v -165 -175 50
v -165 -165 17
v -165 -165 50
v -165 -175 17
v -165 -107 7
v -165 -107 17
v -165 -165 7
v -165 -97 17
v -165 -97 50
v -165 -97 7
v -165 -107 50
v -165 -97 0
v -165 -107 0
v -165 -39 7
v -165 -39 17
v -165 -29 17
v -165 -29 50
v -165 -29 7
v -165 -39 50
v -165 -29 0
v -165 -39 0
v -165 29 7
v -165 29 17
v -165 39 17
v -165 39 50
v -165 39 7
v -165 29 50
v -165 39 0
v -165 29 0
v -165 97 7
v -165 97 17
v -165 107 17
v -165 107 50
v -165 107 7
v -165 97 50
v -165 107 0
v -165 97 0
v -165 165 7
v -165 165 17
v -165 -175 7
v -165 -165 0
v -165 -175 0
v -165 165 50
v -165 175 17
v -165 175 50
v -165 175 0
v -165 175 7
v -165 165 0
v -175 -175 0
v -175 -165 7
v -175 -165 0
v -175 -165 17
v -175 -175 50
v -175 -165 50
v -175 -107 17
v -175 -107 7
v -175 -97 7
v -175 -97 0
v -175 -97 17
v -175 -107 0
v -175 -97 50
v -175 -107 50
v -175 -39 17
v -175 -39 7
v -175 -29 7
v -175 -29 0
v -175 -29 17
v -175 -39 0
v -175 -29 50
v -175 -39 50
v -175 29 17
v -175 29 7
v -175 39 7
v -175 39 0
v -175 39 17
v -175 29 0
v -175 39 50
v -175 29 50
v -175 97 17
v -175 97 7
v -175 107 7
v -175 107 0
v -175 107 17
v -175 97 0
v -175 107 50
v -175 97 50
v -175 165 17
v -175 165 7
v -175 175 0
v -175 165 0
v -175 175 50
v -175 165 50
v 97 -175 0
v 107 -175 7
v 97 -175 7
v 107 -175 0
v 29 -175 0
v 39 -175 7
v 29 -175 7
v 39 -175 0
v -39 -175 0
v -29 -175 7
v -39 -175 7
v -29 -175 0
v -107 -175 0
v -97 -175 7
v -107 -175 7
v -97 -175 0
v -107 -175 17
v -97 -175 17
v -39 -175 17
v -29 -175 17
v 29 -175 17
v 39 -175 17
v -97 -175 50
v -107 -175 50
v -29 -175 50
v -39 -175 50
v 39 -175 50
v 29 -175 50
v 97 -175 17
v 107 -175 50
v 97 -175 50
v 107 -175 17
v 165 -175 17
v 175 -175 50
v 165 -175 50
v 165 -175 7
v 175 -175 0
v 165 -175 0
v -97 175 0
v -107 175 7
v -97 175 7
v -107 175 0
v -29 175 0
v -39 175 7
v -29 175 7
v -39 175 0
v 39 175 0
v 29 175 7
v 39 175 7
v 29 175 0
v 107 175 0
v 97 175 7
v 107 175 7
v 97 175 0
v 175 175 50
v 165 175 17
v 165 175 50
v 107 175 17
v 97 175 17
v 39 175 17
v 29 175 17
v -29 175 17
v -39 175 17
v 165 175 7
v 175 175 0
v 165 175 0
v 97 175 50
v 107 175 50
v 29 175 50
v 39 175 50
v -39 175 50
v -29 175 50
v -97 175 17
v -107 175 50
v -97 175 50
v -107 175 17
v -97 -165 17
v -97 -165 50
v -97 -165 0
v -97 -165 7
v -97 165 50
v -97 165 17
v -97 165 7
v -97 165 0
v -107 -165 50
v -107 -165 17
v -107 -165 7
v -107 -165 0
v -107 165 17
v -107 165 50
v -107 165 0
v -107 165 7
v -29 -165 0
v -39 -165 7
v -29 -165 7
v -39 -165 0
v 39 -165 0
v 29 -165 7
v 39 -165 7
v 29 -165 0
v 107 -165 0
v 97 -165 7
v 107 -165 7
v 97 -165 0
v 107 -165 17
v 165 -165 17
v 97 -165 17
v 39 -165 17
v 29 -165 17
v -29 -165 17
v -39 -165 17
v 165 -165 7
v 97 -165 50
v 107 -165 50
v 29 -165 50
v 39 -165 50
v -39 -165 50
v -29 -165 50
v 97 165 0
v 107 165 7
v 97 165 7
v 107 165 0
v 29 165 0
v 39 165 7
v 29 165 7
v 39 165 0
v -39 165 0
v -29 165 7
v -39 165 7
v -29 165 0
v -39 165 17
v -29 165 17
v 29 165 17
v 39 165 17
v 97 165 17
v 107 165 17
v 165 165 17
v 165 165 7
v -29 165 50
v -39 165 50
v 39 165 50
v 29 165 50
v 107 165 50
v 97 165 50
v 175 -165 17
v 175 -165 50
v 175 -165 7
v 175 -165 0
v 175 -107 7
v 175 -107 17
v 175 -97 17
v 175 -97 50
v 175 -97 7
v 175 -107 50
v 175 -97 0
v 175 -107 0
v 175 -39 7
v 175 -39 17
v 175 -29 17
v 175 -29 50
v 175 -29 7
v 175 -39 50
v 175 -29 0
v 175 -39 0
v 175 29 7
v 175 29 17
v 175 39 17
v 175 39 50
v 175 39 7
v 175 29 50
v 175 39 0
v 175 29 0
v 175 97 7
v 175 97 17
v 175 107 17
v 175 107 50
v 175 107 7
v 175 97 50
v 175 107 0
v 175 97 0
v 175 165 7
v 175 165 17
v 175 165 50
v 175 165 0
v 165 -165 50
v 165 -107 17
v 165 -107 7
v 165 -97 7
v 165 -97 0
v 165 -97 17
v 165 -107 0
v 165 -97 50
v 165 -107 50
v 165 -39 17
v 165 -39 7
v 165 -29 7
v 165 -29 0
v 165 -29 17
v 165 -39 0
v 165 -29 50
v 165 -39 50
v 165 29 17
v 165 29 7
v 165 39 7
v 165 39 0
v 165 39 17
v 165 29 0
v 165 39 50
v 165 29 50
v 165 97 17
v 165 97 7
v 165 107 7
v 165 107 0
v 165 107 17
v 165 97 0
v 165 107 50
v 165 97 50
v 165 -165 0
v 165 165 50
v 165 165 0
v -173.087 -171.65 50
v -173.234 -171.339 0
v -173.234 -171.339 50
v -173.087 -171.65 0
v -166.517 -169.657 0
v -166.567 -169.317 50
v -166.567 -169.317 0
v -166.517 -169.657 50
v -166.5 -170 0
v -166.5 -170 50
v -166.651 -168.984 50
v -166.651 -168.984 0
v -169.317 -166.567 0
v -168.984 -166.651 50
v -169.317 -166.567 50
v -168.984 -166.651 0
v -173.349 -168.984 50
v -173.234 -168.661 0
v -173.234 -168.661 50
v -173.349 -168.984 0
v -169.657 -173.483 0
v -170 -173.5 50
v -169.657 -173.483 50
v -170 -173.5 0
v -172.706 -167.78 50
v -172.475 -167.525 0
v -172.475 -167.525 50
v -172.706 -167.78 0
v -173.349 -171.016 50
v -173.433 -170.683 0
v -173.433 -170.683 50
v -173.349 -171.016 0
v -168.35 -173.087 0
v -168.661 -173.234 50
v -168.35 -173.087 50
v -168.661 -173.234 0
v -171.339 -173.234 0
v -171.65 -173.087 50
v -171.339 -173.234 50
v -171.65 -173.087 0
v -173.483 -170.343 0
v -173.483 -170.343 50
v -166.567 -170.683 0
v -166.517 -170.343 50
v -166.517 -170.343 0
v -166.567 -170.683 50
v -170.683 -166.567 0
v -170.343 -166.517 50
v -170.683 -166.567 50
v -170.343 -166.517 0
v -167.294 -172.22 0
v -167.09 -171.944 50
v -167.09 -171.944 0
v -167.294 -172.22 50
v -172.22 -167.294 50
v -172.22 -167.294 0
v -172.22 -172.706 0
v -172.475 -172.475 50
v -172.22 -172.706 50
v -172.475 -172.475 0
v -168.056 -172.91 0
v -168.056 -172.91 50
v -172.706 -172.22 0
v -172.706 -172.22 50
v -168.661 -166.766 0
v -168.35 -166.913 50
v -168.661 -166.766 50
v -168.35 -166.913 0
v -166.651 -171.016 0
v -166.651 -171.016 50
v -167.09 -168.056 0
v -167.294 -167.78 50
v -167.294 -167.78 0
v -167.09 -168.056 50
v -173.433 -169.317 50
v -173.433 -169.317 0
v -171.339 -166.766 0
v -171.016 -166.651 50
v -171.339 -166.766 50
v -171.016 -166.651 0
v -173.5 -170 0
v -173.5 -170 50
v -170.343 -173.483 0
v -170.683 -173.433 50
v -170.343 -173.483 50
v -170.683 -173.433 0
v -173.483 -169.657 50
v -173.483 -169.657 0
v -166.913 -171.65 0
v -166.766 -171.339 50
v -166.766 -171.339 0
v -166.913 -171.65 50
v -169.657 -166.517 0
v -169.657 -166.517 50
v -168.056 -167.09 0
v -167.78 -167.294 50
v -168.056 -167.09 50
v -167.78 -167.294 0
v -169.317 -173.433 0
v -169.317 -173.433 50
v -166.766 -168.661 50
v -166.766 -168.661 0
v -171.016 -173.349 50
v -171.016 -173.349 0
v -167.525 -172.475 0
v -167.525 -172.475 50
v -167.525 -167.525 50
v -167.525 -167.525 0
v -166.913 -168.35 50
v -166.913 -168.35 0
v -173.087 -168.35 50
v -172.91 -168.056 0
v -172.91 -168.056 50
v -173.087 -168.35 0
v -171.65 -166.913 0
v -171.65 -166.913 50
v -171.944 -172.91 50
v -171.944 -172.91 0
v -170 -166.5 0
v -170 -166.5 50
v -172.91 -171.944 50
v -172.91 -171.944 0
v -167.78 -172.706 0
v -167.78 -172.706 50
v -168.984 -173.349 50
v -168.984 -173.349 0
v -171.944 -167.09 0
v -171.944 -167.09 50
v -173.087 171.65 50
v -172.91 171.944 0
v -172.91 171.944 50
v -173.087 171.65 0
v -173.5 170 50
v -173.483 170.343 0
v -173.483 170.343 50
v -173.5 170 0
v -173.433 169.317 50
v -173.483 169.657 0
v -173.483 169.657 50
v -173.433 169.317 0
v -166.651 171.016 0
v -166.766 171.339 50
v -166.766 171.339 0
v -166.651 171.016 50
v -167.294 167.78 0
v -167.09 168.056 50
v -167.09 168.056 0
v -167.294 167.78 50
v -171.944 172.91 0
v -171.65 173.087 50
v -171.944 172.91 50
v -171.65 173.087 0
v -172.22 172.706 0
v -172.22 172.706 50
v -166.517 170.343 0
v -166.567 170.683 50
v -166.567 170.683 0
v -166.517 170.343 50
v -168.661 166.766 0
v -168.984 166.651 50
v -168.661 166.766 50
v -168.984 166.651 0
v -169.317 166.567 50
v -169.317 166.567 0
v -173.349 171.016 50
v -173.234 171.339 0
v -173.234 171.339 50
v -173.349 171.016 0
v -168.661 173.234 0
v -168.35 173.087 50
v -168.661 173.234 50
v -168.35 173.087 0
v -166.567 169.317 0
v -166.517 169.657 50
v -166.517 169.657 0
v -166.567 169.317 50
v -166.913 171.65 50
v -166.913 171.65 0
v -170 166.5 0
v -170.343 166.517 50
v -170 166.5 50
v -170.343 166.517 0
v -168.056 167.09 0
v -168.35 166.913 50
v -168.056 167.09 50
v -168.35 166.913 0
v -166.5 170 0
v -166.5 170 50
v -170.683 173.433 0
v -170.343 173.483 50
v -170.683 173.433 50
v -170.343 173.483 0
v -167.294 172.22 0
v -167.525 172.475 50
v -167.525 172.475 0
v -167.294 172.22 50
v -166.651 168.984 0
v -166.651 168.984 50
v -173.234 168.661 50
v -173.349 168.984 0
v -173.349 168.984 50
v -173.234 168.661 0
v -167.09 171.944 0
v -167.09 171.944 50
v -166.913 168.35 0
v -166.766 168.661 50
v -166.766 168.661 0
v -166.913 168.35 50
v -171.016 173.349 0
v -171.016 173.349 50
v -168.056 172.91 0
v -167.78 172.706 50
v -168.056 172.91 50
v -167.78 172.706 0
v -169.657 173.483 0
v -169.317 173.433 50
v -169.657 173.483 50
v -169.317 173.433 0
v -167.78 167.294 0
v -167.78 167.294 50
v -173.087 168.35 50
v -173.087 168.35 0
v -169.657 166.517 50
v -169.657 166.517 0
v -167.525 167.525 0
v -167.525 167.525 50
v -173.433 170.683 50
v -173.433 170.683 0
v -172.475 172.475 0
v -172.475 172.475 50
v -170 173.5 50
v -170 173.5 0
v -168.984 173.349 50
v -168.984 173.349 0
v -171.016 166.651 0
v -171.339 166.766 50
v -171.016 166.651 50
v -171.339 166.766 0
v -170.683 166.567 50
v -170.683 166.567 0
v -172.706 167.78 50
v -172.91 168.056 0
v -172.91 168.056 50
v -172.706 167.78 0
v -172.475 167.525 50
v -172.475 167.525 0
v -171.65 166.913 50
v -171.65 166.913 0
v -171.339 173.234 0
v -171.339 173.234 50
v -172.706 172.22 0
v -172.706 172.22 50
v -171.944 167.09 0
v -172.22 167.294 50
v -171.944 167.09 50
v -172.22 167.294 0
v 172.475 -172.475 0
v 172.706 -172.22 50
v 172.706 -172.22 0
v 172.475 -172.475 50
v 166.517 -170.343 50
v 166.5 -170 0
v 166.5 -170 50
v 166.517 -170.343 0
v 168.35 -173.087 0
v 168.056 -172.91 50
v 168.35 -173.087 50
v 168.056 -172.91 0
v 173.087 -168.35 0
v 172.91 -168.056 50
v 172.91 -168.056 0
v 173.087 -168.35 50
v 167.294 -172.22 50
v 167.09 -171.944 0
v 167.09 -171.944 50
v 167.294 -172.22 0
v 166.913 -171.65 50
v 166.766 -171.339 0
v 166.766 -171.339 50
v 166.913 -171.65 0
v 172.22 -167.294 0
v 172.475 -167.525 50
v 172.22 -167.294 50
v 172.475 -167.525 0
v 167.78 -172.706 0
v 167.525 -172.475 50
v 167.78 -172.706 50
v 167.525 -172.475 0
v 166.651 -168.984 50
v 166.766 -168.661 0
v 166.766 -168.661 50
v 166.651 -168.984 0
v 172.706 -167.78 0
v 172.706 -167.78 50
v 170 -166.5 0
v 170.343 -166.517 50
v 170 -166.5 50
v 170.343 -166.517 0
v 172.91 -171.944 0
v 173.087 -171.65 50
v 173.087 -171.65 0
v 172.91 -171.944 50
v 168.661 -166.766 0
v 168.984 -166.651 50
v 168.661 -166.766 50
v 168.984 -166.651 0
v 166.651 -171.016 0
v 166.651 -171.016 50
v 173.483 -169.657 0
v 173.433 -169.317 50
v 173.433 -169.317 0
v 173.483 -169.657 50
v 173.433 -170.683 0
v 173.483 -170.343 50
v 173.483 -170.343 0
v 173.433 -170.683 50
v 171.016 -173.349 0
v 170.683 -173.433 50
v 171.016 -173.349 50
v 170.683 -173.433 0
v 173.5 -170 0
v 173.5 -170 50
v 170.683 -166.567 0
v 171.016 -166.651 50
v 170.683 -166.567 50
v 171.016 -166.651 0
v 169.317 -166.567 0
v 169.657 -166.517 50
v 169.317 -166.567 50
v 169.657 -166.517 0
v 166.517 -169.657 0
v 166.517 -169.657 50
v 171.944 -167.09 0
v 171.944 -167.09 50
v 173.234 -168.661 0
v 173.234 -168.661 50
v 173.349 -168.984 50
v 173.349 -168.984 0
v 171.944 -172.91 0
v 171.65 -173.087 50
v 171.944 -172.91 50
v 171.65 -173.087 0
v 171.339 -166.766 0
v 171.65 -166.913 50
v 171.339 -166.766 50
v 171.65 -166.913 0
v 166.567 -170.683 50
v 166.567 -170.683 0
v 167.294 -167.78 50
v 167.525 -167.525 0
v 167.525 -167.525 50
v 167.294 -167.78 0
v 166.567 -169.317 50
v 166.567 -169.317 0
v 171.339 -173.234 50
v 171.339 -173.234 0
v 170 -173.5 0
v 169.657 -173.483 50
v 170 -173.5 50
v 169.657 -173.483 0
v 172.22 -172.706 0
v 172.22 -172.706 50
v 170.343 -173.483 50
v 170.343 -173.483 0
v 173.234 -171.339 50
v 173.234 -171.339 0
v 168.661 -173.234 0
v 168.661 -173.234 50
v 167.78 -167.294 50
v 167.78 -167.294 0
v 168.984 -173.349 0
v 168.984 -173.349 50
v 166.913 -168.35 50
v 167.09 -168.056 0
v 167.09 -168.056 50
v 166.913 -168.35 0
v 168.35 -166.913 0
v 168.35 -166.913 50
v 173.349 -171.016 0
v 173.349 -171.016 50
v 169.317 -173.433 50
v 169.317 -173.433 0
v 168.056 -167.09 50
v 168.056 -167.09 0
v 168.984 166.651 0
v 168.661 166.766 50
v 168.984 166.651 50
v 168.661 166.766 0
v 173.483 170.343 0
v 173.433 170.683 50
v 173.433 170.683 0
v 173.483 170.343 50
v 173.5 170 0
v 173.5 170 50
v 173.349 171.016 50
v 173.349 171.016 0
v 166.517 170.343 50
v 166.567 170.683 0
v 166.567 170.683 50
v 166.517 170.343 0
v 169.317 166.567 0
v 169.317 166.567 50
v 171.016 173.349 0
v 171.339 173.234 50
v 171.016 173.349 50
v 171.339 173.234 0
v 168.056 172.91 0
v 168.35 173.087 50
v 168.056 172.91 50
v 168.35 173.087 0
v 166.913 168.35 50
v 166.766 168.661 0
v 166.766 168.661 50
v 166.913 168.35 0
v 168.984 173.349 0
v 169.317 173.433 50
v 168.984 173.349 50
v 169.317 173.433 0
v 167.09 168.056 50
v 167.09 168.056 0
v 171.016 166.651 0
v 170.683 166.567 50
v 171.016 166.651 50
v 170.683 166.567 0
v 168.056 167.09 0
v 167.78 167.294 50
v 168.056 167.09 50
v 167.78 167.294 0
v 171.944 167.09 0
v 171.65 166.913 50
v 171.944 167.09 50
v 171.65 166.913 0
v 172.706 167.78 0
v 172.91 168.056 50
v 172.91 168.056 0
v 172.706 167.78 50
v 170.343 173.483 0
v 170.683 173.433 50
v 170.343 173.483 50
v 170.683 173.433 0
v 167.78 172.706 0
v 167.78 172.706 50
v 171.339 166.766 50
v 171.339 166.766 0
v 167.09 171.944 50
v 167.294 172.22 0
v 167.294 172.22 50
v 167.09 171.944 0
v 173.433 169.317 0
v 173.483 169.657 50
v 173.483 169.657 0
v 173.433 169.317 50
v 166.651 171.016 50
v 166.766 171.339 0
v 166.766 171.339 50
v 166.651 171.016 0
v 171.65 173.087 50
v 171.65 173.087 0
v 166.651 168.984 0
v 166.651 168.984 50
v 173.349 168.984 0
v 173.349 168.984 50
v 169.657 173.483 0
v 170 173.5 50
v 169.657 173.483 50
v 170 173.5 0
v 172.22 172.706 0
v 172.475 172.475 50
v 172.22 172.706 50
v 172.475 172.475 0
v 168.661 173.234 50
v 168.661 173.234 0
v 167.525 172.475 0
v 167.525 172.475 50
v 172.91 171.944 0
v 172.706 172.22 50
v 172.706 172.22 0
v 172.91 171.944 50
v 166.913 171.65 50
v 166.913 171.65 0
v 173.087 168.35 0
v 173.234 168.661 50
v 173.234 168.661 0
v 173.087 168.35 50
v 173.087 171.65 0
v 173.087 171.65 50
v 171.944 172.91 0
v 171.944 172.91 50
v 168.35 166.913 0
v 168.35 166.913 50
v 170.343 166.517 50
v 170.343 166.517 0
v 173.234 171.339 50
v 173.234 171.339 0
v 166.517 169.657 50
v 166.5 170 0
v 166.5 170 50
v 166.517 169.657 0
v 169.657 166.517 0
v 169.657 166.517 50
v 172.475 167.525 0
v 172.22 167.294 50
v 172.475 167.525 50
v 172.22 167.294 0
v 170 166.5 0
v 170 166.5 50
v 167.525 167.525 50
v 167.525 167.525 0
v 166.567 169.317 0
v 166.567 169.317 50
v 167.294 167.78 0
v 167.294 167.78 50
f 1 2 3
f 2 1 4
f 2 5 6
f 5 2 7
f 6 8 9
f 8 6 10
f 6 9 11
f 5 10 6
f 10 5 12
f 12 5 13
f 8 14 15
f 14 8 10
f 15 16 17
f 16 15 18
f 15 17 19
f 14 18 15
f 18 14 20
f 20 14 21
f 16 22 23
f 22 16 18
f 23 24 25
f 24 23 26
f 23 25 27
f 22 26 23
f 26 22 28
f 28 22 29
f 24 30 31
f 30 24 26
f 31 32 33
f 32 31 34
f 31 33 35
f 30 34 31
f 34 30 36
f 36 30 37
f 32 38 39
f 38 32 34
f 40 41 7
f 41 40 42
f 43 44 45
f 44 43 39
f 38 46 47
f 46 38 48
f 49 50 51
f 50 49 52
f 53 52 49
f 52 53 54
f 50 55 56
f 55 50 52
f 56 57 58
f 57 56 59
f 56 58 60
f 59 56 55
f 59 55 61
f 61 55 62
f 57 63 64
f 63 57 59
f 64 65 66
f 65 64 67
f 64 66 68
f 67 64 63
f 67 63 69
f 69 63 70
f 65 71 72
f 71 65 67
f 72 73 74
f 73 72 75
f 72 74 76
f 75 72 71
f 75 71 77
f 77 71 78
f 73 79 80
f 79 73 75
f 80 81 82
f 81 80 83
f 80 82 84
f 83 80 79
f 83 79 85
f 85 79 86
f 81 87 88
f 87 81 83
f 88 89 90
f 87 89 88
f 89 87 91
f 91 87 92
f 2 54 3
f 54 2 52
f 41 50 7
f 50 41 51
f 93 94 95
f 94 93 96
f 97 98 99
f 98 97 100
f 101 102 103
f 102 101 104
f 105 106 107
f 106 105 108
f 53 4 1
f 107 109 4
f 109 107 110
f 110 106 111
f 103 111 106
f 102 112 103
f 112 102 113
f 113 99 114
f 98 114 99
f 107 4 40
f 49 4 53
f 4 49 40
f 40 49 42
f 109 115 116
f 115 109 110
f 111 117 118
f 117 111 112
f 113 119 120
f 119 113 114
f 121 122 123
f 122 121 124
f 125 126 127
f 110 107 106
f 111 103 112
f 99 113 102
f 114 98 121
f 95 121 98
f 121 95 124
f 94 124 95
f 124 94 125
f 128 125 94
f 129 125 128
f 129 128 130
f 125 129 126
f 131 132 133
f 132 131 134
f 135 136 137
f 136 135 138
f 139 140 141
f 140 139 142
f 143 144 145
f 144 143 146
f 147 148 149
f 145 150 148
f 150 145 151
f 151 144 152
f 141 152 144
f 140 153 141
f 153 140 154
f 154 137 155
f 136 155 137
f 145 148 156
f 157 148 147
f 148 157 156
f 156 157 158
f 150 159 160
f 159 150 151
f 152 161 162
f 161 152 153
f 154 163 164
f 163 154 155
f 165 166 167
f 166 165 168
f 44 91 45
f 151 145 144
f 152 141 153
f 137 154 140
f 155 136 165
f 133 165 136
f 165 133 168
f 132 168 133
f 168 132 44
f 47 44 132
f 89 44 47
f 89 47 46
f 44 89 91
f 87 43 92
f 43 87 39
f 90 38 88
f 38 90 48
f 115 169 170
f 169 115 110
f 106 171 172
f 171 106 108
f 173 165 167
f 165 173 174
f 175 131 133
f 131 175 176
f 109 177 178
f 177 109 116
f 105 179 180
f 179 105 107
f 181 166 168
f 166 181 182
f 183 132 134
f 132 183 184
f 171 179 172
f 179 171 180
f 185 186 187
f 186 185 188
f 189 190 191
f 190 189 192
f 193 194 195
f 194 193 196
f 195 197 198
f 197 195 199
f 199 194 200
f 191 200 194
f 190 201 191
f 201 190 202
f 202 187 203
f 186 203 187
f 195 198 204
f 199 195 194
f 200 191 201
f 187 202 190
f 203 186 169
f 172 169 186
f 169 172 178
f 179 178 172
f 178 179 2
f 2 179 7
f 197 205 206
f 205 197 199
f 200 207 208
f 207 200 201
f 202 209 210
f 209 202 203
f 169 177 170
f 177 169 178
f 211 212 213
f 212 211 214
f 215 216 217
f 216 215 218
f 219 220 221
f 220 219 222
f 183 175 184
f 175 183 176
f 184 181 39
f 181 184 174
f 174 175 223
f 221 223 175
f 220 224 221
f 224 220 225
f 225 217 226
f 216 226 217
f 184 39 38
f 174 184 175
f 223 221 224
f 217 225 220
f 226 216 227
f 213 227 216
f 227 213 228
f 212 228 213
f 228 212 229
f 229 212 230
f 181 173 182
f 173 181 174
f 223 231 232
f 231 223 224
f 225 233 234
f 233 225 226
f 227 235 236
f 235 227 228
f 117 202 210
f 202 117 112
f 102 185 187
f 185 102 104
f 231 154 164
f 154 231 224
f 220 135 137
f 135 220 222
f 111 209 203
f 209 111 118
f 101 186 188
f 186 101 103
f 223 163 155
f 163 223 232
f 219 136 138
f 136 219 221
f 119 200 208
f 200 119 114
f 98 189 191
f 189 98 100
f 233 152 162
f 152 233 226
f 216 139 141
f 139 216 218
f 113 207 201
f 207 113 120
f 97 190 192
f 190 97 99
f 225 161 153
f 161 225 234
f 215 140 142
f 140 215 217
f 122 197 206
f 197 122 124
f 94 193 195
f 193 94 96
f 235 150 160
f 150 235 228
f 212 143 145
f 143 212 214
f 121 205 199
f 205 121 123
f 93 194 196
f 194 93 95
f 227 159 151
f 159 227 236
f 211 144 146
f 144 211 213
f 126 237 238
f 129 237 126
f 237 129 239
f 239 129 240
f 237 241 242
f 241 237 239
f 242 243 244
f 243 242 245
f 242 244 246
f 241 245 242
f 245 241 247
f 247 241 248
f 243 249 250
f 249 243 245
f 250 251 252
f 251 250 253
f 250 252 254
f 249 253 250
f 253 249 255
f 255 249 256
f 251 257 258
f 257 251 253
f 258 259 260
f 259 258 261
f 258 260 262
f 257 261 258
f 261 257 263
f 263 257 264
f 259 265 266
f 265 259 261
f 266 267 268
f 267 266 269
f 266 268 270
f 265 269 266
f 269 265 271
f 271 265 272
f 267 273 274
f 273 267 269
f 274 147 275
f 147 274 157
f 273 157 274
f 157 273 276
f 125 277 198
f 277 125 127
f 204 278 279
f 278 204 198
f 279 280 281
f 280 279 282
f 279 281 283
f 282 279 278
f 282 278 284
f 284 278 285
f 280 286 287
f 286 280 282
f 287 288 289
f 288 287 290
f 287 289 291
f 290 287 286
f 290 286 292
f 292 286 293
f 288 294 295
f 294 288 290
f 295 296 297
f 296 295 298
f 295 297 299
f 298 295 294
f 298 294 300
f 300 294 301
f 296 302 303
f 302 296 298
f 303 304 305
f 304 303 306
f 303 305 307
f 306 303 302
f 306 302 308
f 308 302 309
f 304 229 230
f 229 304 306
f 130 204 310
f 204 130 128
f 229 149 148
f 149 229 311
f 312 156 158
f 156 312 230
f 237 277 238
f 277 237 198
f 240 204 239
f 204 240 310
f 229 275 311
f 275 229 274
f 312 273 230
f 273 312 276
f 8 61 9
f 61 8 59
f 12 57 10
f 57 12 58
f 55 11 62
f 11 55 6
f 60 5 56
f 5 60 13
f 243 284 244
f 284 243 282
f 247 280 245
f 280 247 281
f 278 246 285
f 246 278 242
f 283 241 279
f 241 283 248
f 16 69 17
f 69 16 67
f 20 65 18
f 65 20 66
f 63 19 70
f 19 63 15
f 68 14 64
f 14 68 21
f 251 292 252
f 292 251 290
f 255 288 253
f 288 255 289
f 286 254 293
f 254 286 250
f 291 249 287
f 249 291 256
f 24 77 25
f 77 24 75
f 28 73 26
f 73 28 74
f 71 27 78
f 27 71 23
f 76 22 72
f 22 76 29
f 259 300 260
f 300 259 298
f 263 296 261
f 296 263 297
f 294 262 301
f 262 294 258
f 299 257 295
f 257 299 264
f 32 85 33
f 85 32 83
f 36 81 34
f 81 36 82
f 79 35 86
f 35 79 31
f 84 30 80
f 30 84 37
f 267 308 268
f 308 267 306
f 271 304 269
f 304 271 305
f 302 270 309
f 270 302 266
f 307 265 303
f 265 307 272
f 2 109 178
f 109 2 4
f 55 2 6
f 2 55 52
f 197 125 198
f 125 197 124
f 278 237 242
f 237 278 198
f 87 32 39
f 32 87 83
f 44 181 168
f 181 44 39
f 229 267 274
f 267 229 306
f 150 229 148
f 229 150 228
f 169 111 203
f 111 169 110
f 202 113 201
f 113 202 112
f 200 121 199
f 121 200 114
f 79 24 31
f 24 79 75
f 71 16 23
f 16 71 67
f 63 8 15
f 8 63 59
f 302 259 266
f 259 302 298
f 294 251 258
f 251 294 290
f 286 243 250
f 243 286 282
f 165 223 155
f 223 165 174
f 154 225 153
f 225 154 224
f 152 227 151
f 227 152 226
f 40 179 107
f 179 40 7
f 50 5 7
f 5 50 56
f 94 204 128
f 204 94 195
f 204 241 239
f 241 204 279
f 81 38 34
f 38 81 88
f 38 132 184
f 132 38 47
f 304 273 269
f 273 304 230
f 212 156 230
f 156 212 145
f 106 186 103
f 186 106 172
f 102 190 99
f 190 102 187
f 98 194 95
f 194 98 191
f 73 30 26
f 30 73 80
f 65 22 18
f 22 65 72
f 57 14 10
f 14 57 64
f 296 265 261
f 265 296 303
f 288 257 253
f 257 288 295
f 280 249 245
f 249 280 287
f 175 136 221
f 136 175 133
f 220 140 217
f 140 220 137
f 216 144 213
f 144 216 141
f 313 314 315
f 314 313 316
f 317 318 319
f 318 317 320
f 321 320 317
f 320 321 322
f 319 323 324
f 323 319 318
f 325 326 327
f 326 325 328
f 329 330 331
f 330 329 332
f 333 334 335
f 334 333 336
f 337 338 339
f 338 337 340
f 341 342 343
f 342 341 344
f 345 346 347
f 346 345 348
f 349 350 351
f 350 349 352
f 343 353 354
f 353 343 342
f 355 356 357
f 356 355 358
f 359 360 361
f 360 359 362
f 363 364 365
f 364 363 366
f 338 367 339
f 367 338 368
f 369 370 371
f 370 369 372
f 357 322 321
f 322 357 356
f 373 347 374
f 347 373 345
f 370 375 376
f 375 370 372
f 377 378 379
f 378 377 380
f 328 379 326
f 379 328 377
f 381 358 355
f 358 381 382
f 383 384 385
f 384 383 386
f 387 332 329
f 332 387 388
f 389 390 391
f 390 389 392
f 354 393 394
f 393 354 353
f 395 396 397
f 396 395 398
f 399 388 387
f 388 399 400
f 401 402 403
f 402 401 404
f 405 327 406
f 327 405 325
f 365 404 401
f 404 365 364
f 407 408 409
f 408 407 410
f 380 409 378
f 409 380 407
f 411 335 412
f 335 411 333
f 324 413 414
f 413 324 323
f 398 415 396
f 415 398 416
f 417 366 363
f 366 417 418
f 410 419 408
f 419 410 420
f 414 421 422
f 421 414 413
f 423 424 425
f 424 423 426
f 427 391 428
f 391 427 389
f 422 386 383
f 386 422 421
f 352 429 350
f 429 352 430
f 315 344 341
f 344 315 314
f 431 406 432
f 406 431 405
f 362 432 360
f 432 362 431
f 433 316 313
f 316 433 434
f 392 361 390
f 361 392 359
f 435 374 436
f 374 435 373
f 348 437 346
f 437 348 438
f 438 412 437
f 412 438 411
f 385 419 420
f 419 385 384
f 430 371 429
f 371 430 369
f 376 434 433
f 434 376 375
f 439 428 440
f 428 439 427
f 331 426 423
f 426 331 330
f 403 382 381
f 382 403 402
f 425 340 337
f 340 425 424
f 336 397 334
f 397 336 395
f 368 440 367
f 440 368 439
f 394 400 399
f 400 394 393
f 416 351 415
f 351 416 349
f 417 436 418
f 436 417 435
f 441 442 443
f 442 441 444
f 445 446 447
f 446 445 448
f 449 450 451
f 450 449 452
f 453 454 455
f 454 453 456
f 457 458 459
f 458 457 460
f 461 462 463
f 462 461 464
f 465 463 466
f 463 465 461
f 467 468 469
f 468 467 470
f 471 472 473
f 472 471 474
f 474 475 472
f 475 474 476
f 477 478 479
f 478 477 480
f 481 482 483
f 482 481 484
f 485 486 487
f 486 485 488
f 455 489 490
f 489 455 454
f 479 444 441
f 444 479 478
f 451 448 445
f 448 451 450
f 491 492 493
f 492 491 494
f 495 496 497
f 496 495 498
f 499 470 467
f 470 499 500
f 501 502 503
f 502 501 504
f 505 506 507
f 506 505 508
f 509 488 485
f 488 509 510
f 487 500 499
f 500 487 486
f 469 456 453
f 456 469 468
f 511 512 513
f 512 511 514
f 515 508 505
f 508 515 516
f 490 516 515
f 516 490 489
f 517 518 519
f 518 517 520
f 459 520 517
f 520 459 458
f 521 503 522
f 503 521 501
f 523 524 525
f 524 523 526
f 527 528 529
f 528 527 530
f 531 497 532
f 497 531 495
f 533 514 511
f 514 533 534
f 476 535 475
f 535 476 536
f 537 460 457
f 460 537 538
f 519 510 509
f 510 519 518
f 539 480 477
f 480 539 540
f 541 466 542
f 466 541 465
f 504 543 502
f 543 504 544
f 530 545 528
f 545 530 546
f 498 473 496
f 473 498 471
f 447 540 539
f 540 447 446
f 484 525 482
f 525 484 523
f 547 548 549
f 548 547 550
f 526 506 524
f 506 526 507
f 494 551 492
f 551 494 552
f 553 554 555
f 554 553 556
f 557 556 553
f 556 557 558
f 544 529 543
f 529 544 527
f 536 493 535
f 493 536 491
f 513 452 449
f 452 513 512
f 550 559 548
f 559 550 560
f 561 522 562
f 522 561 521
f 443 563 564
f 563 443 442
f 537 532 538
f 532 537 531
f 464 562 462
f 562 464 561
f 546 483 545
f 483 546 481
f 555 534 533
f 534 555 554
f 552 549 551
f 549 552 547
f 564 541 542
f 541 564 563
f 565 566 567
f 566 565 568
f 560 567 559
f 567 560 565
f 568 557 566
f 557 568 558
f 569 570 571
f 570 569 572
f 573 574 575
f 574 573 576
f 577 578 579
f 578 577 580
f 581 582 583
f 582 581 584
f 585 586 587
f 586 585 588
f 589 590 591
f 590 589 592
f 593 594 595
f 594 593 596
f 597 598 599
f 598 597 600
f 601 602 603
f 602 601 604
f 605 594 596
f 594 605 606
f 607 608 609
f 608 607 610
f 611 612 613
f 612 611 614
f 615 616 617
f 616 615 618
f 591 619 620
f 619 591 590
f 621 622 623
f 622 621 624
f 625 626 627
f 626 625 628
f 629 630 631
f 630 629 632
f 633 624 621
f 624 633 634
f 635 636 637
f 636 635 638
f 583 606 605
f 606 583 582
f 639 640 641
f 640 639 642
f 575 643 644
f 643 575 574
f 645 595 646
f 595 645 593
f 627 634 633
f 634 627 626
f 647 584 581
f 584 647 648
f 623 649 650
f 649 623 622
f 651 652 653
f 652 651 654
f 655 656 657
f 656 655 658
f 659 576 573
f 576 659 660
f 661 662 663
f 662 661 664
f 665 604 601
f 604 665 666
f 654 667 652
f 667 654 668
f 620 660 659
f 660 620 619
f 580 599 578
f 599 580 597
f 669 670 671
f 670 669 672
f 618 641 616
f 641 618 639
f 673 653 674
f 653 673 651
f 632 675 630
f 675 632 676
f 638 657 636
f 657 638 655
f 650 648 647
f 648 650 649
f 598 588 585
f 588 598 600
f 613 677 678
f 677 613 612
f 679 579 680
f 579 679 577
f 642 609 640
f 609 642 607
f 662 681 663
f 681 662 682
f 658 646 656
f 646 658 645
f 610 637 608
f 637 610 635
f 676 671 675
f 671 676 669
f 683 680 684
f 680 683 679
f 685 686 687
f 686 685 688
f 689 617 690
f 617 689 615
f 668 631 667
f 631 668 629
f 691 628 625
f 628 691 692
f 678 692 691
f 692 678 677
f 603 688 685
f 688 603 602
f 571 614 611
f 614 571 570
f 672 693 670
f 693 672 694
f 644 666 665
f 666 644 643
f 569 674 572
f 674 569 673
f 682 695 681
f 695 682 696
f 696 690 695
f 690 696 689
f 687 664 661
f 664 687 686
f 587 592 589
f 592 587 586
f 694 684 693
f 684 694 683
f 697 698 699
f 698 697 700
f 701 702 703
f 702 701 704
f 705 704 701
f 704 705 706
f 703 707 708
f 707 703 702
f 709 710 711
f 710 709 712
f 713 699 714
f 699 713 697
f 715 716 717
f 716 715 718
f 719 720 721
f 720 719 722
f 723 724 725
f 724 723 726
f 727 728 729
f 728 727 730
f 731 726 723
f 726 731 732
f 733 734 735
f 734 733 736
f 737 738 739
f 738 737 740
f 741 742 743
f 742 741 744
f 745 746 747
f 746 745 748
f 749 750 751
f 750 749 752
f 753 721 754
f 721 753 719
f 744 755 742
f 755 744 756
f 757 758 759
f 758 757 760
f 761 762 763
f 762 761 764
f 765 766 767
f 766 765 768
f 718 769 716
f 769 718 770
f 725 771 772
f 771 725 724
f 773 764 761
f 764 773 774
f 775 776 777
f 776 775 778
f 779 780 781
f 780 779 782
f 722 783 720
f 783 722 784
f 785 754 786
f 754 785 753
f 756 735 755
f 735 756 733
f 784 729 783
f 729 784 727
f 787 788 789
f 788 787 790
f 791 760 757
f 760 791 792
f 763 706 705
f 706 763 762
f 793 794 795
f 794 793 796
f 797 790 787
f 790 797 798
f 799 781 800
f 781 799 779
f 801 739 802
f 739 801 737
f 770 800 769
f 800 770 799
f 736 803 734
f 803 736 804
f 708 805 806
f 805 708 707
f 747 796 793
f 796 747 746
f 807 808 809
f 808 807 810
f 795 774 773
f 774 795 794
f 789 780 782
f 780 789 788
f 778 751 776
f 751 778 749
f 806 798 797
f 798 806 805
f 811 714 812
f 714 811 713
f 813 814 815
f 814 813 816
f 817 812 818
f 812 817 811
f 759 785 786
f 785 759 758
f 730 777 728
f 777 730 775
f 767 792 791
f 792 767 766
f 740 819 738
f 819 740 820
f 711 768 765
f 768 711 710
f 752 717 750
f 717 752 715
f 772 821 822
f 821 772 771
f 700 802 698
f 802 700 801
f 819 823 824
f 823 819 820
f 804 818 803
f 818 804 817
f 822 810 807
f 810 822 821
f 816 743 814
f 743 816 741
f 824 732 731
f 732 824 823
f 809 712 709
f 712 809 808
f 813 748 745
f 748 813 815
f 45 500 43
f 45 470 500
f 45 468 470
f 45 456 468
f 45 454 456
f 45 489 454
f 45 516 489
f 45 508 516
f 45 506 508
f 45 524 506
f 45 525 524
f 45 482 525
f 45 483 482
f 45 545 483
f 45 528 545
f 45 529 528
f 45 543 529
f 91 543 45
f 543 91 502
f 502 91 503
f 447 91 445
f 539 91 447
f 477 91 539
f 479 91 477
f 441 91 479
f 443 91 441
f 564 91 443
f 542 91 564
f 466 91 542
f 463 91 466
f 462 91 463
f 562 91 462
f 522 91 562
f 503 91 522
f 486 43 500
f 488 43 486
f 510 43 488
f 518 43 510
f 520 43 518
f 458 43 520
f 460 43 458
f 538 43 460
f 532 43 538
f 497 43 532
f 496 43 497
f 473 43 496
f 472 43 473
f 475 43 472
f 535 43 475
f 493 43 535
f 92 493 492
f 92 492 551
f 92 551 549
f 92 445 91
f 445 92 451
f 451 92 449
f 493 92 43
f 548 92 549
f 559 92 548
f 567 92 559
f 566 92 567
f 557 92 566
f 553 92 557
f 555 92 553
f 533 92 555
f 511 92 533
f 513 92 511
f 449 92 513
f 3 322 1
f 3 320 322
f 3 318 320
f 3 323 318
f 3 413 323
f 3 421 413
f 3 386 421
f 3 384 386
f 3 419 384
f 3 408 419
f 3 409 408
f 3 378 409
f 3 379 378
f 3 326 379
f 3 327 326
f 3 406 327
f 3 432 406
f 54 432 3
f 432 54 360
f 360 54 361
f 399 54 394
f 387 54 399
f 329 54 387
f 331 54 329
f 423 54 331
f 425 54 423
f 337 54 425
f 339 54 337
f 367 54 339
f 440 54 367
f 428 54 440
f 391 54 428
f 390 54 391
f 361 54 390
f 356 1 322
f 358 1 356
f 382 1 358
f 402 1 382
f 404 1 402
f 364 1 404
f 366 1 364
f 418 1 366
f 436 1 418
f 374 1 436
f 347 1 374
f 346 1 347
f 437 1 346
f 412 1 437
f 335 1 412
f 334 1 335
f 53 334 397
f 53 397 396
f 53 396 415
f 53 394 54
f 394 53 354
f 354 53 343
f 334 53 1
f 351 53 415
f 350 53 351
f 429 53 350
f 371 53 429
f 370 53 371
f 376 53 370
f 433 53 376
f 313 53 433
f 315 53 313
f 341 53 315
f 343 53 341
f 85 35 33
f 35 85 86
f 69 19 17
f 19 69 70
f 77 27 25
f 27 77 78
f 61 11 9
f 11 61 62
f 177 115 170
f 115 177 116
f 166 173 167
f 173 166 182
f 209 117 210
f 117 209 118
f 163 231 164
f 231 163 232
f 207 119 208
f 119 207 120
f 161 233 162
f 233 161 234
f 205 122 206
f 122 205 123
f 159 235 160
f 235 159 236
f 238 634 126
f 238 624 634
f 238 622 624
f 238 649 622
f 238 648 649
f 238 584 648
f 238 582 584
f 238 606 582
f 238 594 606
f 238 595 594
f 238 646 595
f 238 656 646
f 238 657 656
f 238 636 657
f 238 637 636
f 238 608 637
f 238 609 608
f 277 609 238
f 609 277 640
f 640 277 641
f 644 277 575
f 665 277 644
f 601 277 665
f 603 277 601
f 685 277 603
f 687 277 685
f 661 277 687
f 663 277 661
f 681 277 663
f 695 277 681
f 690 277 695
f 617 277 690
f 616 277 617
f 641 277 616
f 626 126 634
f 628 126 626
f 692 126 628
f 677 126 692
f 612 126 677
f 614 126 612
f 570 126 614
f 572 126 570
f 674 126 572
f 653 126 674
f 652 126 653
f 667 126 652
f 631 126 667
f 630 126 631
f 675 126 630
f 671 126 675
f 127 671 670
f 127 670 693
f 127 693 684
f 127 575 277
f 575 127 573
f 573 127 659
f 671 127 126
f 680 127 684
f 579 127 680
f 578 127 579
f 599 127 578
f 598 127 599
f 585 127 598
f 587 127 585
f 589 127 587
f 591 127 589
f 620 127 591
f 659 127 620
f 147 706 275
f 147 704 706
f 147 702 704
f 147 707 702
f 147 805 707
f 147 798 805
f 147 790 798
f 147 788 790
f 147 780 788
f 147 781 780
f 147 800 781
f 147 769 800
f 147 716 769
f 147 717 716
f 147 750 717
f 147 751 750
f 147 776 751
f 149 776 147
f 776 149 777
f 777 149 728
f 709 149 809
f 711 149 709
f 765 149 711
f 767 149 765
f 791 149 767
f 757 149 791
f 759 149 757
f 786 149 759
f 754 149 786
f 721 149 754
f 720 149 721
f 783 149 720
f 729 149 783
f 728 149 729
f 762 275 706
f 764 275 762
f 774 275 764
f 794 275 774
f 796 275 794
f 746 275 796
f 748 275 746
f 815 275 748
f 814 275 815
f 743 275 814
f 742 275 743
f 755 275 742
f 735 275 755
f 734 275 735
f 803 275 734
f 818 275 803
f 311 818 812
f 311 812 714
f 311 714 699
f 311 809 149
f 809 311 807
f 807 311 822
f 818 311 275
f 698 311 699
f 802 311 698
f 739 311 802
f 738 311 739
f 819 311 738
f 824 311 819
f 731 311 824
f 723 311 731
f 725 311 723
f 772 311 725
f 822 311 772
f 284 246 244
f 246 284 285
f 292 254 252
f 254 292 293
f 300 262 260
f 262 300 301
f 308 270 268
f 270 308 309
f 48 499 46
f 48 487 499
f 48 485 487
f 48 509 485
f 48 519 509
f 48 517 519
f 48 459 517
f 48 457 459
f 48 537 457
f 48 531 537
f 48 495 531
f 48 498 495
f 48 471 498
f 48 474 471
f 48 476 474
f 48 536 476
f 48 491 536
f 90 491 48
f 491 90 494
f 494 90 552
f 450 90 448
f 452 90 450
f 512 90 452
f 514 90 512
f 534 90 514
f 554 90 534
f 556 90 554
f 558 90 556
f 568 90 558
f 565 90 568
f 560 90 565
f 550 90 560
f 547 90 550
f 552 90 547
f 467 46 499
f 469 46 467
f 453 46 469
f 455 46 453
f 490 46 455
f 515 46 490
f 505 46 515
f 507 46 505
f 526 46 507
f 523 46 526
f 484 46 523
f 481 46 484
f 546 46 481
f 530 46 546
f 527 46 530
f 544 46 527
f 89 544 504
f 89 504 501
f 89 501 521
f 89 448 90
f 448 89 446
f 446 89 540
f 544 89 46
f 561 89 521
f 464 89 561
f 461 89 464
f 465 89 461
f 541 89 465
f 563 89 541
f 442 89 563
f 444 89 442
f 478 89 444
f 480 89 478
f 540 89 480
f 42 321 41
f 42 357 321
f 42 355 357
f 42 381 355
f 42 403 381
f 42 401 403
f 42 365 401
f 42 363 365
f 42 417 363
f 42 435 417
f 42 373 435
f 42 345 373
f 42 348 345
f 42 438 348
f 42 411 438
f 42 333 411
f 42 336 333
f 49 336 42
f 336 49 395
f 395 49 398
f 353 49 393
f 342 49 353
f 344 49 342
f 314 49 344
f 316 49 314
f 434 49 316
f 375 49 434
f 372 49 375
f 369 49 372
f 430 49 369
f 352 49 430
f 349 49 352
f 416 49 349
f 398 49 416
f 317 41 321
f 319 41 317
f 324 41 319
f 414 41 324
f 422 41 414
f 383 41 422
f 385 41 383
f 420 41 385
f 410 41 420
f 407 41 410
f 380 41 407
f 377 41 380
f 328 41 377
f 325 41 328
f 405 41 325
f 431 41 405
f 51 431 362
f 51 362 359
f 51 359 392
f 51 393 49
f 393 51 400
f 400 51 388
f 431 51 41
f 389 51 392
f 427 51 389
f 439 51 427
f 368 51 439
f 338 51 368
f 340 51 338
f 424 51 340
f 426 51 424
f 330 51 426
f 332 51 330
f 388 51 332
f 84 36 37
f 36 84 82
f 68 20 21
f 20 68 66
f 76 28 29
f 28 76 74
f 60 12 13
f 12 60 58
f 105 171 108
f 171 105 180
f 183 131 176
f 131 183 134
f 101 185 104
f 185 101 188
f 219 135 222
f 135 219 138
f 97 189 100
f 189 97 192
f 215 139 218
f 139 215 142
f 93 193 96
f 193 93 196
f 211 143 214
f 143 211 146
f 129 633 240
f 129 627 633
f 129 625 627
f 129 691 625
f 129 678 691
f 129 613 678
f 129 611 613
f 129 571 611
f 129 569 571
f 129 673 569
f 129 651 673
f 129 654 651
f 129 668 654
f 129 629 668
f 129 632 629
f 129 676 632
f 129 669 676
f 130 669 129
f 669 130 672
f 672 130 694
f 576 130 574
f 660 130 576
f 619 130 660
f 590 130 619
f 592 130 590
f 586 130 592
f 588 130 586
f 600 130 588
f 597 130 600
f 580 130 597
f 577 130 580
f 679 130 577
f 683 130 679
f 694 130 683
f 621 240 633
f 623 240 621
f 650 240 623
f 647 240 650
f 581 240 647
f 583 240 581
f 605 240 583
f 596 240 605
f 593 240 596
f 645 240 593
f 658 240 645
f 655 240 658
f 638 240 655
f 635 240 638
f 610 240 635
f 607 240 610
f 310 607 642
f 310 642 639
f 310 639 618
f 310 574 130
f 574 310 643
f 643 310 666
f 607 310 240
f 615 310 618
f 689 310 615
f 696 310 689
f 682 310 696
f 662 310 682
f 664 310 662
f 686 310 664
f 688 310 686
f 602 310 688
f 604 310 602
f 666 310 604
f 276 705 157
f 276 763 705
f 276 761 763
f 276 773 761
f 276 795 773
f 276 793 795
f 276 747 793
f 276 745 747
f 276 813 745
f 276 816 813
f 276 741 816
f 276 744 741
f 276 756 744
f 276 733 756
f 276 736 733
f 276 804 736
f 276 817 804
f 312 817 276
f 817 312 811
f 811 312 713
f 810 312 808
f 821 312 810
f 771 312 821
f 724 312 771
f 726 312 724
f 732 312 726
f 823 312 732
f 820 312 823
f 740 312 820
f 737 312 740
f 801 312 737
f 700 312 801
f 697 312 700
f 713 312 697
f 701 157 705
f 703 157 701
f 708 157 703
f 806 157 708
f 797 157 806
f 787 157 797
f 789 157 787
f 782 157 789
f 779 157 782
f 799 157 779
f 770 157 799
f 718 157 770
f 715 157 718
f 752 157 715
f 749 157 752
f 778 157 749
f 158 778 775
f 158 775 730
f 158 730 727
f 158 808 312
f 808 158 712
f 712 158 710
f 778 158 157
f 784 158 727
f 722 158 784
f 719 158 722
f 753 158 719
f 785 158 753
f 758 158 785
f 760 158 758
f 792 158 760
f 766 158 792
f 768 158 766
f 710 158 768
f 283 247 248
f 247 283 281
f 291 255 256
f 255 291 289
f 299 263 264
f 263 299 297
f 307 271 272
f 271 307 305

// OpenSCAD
// Cage slice - index 4
bar = 10;
outer = 350;
half = outer / 2;
height = 700;

N_xy = 6;
N_z  = 11;

x_spacing = (outer - bar) / (N_xy - 1);
z_spacing = (height - bar) / (N_z  - 1);

xs = [ for (i = [0 : N_xy - 1]) (-half + bar/2 + i * x_spacing) ];
ys = xs;

zs = [ for (k = [0 : N_z - 1]) (bar/2 + k * z_spacing) ];

$fn = 64;

module cage_bars() {
    union() {
        // Vertical bars on front and back faces
        for (xv = xs) {
            translate([xv, -half + bar/2, height/2])
                cube([bar, bar, height], center = true);
            translate([xv,  half - bar/2, height/2])
                cube([bar, bar, height], center = true);
        }

        // Vertical bars on left and right faces
        for (yv = ys) {
            translate([-half + bar/2, yv, height/2])
                cube([bar, bar, height], center = true);
            translate([ half - bar/2, yv, height/2])
                cube([bar, bar, height], center = true);
        }

        // Horizontal x-bars on front and back faces
        for (zv = zs) {
            translate([0, -half + bar/2, zv])
                cube([outer, bar, bar], center = true);
            translate([0,  half - bar/2, zv])
                cube([outer, bar, bar], center = true);
        }

        // Horizontal y-bars on left and right faces
        for (zv = zs) {
            translate([-half + bar/2, 0, zv])
                cube([bar, outer, bar], center = true);
            translate([ half - bar/2, 0, zv])
                cube([bar, outer, bar], center = true);
        }

        // Floor and ceiling extra x-bars at all y positions
        z_floor = bar/2;
        z_ceil  = height - bar/2;
        for (yv = ys) {
            translate([0, yv, z_floor])
                cube([outer, bar, bar], center = true);
            translate([0, yv, z_ceil])
                cube([outer, bar, bar], center = true);
        }

        // Floor and ceiling extra y-bars at all x positions
        for (xv = xs) {
            translate([xv, 0, z_floor])
                cube([bar, outer, bar], center = true);
            translate([xv, 0, z_ceil])
                cube([bar, outer, bar], center = true);
        }
    }
}

module corner_holes() {
    hole_d = 7;
    for (sx = [-1, 1])
        for (sy = [-1, 1])
            translate([sx * (half - bar/2), sy * (half - bar/2), height/2])
                cylinder(h = height + 2, d = hole_d, center = true);
}

module cage_full() {
    difference() {
        cage_bars();
        corner_holes();
    }
}

slice_index = 4;
slice_height = 50;

module cage_slice() {
    translate([0, 0, -slice_index * slice_height]) {
        intersection() {
            cage_full();
            translate([0, 0, slice_index * slice_height + slice_height/2])
                cube([outer + 20, outer + 20, slice_height], center = true);
        }
    }
}

cage_slice();
